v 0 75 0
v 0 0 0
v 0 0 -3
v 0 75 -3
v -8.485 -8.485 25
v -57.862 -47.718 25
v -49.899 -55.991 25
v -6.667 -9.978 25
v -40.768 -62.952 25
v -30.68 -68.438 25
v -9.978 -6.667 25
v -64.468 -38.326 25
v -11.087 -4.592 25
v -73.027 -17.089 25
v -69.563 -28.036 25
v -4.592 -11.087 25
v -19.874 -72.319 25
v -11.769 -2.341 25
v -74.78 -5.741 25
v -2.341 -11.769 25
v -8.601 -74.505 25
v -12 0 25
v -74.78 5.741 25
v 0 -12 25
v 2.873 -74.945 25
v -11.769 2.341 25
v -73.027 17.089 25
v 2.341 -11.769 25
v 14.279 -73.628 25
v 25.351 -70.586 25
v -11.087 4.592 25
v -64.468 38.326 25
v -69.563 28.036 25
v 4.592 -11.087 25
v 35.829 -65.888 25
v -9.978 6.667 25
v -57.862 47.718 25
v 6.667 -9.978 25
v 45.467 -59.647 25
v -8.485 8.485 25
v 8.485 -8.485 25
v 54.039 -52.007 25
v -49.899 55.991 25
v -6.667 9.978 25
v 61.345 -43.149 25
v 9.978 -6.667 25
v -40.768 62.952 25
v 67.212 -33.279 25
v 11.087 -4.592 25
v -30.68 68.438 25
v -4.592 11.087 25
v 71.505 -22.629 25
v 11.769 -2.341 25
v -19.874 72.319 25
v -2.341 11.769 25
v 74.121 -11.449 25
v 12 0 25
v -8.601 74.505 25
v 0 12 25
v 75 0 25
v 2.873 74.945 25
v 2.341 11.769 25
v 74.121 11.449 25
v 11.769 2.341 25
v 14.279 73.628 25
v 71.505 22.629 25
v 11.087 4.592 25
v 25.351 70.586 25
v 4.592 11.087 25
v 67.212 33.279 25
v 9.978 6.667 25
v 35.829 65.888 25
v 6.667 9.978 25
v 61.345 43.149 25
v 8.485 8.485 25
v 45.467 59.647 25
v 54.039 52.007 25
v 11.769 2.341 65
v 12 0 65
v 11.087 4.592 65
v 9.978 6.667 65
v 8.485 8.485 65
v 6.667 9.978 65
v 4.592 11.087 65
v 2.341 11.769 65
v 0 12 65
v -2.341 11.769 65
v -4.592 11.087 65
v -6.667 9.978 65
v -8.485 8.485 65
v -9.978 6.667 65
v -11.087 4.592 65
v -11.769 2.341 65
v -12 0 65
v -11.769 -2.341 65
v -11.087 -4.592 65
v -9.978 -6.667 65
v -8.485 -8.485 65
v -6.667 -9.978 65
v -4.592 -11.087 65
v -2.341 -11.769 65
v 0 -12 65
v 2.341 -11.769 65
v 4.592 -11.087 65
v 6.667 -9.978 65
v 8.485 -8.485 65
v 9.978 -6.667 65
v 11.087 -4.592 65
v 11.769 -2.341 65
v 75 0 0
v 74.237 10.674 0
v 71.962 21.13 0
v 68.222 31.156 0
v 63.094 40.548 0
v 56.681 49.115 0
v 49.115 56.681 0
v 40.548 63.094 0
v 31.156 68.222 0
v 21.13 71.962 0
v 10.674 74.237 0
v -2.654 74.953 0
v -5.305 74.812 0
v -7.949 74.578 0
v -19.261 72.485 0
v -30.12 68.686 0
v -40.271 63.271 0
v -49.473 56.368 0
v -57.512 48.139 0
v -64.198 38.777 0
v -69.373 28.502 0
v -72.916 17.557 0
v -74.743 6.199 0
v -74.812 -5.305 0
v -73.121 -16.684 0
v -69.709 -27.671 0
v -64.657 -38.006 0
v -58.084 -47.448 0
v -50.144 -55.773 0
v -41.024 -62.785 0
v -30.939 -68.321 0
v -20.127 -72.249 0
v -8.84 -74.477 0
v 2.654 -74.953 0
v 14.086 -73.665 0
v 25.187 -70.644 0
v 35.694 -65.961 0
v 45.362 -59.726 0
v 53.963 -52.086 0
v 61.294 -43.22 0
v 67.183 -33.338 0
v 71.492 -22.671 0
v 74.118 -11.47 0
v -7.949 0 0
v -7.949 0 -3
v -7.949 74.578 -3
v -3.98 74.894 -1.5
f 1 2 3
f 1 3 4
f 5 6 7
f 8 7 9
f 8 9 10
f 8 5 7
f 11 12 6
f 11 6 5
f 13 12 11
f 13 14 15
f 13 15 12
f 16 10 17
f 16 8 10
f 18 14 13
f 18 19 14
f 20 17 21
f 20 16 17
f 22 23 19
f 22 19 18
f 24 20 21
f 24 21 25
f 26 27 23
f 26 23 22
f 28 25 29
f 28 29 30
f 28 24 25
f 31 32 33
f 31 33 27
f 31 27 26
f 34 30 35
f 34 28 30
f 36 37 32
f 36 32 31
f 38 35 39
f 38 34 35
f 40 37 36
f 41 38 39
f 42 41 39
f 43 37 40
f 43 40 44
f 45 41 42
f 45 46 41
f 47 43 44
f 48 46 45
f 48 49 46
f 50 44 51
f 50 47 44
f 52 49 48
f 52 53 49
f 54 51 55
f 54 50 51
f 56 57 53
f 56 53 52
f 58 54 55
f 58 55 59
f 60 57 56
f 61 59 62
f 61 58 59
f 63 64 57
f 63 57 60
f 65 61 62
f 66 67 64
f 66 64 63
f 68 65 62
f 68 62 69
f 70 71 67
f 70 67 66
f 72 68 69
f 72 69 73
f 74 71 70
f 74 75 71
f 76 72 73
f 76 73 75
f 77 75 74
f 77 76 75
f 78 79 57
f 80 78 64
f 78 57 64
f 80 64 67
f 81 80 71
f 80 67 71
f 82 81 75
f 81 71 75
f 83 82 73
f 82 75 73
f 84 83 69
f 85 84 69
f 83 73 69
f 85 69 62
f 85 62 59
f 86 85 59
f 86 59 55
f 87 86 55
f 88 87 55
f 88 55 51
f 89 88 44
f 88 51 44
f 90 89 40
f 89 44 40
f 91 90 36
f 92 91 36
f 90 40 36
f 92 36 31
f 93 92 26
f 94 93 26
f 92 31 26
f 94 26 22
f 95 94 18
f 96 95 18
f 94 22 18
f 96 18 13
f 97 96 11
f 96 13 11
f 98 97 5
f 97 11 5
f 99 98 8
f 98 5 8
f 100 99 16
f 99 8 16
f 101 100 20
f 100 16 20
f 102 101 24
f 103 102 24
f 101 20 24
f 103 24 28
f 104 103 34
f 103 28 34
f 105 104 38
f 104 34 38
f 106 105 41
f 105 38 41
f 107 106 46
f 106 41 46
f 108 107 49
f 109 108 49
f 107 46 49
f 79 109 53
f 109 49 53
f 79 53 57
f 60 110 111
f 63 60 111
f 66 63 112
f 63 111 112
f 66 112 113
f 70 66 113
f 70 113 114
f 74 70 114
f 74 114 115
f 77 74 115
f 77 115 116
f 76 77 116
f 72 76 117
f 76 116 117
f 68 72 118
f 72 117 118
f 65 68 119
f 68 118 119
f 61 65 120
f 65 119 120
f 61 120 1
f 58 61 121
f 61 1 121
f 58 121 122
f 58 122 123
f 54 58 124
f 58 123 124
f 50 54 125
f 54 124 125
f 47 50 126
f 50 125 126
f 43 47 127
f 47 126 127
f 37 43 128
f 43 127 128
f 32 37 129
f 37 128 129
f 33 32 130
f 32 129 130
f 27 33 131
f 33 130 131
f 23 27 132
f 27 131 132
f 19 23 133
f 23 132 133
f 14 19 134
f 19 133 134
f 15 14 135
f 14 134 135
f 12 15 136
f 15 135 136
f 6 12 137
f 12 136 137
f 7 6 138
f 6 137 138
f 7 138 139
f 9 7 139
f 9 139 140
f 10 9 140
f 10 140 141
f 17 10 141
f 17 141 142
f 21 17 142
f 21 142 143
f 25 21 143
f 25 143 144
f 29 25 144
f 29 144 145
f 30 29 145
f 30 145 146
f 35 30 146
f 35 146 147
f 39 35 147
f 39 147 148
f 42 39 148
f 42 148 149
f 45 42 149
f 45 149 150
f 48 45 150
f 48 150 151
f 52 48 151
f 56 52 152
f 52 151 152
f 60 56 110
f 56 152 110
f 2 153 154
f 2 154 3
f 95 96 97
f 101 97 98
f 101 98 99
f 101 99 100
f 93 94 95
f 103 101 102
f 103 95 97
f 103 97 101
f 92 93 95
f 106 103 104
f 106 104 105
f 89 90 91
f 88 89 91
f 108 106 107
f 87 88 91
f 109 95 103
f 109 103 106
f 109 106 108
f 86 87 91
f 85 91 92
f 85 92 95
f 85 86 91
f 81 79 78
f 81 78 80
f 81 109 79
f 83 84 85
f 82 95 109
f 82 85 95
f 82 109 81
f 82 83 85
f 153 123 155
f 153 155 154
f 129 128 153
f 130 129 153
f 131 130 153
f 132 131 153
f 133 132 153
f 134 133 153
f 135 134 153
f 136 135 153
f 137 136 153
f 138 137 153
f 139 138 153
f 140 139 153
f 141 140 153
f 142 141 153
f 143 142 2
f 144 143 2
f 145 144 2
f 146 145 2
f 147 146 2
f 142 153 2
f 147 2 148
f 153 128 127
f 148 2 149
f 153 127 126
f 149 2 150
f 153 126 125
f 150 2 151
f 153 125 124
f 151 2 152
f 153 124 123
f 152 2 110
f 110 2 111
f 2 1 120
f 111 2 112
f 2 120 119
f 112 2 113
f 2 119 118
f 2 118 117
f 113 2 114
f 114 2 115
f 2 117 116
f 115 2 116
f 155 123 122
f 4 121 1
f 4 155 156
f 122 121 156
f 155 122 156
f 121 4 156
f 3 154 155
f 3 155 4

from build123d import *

# Parameters (mm, degrees)
SKETCH1_R           = 75
BOSS_EXTRUDE1_DEPTH = 25
SKETCH2_R           = 12
BOSS_EXTRUDE2_DEPTH = 40
BOSS_EXTRUDE3_DEPTH = 3


with BuildPart() as part:
    # Sketch1 → Boss-Extrude1 (new body)
    with BuildSketch(Plane.XY):
        Circle(SKETCH1_R)
    extrude(amount=BOSS_EXTRUDE1_DEPTH)

    # Sketch2 → Boss-Extrude2 (add)
    with BuildSketch(Plane.XY.offset(25)):
        Circle(SKETCH2_R)
    extrude(amount=BOSS_EXTRUDE2_DEPTH)

    # Sketch3 → Boss-Extrude3 (add)
    with BuildSketch(Plane(origin=(0, 0, 0), x_dir=(-1, 0, 0), z_dir=(0, 0, -1))):
        with BuildLine():
            Line((0, 0), (0, 75))
            add(Edge.make_bspline(
                [(7.949037258, 74.577562354), (3.986254227, 74.999822237), (0, 75)],
                knots=[0, 0, 0, 1, 1, 1], degree=2))
            Line((7.949037258, 74.577562354), (7.949037258, 0))
            Line((7.949037258, 0), (0, 0))
        make_face()
    extrude(amount=BOSS_EXTRUDE3_DEPTH)


solid = part.part
